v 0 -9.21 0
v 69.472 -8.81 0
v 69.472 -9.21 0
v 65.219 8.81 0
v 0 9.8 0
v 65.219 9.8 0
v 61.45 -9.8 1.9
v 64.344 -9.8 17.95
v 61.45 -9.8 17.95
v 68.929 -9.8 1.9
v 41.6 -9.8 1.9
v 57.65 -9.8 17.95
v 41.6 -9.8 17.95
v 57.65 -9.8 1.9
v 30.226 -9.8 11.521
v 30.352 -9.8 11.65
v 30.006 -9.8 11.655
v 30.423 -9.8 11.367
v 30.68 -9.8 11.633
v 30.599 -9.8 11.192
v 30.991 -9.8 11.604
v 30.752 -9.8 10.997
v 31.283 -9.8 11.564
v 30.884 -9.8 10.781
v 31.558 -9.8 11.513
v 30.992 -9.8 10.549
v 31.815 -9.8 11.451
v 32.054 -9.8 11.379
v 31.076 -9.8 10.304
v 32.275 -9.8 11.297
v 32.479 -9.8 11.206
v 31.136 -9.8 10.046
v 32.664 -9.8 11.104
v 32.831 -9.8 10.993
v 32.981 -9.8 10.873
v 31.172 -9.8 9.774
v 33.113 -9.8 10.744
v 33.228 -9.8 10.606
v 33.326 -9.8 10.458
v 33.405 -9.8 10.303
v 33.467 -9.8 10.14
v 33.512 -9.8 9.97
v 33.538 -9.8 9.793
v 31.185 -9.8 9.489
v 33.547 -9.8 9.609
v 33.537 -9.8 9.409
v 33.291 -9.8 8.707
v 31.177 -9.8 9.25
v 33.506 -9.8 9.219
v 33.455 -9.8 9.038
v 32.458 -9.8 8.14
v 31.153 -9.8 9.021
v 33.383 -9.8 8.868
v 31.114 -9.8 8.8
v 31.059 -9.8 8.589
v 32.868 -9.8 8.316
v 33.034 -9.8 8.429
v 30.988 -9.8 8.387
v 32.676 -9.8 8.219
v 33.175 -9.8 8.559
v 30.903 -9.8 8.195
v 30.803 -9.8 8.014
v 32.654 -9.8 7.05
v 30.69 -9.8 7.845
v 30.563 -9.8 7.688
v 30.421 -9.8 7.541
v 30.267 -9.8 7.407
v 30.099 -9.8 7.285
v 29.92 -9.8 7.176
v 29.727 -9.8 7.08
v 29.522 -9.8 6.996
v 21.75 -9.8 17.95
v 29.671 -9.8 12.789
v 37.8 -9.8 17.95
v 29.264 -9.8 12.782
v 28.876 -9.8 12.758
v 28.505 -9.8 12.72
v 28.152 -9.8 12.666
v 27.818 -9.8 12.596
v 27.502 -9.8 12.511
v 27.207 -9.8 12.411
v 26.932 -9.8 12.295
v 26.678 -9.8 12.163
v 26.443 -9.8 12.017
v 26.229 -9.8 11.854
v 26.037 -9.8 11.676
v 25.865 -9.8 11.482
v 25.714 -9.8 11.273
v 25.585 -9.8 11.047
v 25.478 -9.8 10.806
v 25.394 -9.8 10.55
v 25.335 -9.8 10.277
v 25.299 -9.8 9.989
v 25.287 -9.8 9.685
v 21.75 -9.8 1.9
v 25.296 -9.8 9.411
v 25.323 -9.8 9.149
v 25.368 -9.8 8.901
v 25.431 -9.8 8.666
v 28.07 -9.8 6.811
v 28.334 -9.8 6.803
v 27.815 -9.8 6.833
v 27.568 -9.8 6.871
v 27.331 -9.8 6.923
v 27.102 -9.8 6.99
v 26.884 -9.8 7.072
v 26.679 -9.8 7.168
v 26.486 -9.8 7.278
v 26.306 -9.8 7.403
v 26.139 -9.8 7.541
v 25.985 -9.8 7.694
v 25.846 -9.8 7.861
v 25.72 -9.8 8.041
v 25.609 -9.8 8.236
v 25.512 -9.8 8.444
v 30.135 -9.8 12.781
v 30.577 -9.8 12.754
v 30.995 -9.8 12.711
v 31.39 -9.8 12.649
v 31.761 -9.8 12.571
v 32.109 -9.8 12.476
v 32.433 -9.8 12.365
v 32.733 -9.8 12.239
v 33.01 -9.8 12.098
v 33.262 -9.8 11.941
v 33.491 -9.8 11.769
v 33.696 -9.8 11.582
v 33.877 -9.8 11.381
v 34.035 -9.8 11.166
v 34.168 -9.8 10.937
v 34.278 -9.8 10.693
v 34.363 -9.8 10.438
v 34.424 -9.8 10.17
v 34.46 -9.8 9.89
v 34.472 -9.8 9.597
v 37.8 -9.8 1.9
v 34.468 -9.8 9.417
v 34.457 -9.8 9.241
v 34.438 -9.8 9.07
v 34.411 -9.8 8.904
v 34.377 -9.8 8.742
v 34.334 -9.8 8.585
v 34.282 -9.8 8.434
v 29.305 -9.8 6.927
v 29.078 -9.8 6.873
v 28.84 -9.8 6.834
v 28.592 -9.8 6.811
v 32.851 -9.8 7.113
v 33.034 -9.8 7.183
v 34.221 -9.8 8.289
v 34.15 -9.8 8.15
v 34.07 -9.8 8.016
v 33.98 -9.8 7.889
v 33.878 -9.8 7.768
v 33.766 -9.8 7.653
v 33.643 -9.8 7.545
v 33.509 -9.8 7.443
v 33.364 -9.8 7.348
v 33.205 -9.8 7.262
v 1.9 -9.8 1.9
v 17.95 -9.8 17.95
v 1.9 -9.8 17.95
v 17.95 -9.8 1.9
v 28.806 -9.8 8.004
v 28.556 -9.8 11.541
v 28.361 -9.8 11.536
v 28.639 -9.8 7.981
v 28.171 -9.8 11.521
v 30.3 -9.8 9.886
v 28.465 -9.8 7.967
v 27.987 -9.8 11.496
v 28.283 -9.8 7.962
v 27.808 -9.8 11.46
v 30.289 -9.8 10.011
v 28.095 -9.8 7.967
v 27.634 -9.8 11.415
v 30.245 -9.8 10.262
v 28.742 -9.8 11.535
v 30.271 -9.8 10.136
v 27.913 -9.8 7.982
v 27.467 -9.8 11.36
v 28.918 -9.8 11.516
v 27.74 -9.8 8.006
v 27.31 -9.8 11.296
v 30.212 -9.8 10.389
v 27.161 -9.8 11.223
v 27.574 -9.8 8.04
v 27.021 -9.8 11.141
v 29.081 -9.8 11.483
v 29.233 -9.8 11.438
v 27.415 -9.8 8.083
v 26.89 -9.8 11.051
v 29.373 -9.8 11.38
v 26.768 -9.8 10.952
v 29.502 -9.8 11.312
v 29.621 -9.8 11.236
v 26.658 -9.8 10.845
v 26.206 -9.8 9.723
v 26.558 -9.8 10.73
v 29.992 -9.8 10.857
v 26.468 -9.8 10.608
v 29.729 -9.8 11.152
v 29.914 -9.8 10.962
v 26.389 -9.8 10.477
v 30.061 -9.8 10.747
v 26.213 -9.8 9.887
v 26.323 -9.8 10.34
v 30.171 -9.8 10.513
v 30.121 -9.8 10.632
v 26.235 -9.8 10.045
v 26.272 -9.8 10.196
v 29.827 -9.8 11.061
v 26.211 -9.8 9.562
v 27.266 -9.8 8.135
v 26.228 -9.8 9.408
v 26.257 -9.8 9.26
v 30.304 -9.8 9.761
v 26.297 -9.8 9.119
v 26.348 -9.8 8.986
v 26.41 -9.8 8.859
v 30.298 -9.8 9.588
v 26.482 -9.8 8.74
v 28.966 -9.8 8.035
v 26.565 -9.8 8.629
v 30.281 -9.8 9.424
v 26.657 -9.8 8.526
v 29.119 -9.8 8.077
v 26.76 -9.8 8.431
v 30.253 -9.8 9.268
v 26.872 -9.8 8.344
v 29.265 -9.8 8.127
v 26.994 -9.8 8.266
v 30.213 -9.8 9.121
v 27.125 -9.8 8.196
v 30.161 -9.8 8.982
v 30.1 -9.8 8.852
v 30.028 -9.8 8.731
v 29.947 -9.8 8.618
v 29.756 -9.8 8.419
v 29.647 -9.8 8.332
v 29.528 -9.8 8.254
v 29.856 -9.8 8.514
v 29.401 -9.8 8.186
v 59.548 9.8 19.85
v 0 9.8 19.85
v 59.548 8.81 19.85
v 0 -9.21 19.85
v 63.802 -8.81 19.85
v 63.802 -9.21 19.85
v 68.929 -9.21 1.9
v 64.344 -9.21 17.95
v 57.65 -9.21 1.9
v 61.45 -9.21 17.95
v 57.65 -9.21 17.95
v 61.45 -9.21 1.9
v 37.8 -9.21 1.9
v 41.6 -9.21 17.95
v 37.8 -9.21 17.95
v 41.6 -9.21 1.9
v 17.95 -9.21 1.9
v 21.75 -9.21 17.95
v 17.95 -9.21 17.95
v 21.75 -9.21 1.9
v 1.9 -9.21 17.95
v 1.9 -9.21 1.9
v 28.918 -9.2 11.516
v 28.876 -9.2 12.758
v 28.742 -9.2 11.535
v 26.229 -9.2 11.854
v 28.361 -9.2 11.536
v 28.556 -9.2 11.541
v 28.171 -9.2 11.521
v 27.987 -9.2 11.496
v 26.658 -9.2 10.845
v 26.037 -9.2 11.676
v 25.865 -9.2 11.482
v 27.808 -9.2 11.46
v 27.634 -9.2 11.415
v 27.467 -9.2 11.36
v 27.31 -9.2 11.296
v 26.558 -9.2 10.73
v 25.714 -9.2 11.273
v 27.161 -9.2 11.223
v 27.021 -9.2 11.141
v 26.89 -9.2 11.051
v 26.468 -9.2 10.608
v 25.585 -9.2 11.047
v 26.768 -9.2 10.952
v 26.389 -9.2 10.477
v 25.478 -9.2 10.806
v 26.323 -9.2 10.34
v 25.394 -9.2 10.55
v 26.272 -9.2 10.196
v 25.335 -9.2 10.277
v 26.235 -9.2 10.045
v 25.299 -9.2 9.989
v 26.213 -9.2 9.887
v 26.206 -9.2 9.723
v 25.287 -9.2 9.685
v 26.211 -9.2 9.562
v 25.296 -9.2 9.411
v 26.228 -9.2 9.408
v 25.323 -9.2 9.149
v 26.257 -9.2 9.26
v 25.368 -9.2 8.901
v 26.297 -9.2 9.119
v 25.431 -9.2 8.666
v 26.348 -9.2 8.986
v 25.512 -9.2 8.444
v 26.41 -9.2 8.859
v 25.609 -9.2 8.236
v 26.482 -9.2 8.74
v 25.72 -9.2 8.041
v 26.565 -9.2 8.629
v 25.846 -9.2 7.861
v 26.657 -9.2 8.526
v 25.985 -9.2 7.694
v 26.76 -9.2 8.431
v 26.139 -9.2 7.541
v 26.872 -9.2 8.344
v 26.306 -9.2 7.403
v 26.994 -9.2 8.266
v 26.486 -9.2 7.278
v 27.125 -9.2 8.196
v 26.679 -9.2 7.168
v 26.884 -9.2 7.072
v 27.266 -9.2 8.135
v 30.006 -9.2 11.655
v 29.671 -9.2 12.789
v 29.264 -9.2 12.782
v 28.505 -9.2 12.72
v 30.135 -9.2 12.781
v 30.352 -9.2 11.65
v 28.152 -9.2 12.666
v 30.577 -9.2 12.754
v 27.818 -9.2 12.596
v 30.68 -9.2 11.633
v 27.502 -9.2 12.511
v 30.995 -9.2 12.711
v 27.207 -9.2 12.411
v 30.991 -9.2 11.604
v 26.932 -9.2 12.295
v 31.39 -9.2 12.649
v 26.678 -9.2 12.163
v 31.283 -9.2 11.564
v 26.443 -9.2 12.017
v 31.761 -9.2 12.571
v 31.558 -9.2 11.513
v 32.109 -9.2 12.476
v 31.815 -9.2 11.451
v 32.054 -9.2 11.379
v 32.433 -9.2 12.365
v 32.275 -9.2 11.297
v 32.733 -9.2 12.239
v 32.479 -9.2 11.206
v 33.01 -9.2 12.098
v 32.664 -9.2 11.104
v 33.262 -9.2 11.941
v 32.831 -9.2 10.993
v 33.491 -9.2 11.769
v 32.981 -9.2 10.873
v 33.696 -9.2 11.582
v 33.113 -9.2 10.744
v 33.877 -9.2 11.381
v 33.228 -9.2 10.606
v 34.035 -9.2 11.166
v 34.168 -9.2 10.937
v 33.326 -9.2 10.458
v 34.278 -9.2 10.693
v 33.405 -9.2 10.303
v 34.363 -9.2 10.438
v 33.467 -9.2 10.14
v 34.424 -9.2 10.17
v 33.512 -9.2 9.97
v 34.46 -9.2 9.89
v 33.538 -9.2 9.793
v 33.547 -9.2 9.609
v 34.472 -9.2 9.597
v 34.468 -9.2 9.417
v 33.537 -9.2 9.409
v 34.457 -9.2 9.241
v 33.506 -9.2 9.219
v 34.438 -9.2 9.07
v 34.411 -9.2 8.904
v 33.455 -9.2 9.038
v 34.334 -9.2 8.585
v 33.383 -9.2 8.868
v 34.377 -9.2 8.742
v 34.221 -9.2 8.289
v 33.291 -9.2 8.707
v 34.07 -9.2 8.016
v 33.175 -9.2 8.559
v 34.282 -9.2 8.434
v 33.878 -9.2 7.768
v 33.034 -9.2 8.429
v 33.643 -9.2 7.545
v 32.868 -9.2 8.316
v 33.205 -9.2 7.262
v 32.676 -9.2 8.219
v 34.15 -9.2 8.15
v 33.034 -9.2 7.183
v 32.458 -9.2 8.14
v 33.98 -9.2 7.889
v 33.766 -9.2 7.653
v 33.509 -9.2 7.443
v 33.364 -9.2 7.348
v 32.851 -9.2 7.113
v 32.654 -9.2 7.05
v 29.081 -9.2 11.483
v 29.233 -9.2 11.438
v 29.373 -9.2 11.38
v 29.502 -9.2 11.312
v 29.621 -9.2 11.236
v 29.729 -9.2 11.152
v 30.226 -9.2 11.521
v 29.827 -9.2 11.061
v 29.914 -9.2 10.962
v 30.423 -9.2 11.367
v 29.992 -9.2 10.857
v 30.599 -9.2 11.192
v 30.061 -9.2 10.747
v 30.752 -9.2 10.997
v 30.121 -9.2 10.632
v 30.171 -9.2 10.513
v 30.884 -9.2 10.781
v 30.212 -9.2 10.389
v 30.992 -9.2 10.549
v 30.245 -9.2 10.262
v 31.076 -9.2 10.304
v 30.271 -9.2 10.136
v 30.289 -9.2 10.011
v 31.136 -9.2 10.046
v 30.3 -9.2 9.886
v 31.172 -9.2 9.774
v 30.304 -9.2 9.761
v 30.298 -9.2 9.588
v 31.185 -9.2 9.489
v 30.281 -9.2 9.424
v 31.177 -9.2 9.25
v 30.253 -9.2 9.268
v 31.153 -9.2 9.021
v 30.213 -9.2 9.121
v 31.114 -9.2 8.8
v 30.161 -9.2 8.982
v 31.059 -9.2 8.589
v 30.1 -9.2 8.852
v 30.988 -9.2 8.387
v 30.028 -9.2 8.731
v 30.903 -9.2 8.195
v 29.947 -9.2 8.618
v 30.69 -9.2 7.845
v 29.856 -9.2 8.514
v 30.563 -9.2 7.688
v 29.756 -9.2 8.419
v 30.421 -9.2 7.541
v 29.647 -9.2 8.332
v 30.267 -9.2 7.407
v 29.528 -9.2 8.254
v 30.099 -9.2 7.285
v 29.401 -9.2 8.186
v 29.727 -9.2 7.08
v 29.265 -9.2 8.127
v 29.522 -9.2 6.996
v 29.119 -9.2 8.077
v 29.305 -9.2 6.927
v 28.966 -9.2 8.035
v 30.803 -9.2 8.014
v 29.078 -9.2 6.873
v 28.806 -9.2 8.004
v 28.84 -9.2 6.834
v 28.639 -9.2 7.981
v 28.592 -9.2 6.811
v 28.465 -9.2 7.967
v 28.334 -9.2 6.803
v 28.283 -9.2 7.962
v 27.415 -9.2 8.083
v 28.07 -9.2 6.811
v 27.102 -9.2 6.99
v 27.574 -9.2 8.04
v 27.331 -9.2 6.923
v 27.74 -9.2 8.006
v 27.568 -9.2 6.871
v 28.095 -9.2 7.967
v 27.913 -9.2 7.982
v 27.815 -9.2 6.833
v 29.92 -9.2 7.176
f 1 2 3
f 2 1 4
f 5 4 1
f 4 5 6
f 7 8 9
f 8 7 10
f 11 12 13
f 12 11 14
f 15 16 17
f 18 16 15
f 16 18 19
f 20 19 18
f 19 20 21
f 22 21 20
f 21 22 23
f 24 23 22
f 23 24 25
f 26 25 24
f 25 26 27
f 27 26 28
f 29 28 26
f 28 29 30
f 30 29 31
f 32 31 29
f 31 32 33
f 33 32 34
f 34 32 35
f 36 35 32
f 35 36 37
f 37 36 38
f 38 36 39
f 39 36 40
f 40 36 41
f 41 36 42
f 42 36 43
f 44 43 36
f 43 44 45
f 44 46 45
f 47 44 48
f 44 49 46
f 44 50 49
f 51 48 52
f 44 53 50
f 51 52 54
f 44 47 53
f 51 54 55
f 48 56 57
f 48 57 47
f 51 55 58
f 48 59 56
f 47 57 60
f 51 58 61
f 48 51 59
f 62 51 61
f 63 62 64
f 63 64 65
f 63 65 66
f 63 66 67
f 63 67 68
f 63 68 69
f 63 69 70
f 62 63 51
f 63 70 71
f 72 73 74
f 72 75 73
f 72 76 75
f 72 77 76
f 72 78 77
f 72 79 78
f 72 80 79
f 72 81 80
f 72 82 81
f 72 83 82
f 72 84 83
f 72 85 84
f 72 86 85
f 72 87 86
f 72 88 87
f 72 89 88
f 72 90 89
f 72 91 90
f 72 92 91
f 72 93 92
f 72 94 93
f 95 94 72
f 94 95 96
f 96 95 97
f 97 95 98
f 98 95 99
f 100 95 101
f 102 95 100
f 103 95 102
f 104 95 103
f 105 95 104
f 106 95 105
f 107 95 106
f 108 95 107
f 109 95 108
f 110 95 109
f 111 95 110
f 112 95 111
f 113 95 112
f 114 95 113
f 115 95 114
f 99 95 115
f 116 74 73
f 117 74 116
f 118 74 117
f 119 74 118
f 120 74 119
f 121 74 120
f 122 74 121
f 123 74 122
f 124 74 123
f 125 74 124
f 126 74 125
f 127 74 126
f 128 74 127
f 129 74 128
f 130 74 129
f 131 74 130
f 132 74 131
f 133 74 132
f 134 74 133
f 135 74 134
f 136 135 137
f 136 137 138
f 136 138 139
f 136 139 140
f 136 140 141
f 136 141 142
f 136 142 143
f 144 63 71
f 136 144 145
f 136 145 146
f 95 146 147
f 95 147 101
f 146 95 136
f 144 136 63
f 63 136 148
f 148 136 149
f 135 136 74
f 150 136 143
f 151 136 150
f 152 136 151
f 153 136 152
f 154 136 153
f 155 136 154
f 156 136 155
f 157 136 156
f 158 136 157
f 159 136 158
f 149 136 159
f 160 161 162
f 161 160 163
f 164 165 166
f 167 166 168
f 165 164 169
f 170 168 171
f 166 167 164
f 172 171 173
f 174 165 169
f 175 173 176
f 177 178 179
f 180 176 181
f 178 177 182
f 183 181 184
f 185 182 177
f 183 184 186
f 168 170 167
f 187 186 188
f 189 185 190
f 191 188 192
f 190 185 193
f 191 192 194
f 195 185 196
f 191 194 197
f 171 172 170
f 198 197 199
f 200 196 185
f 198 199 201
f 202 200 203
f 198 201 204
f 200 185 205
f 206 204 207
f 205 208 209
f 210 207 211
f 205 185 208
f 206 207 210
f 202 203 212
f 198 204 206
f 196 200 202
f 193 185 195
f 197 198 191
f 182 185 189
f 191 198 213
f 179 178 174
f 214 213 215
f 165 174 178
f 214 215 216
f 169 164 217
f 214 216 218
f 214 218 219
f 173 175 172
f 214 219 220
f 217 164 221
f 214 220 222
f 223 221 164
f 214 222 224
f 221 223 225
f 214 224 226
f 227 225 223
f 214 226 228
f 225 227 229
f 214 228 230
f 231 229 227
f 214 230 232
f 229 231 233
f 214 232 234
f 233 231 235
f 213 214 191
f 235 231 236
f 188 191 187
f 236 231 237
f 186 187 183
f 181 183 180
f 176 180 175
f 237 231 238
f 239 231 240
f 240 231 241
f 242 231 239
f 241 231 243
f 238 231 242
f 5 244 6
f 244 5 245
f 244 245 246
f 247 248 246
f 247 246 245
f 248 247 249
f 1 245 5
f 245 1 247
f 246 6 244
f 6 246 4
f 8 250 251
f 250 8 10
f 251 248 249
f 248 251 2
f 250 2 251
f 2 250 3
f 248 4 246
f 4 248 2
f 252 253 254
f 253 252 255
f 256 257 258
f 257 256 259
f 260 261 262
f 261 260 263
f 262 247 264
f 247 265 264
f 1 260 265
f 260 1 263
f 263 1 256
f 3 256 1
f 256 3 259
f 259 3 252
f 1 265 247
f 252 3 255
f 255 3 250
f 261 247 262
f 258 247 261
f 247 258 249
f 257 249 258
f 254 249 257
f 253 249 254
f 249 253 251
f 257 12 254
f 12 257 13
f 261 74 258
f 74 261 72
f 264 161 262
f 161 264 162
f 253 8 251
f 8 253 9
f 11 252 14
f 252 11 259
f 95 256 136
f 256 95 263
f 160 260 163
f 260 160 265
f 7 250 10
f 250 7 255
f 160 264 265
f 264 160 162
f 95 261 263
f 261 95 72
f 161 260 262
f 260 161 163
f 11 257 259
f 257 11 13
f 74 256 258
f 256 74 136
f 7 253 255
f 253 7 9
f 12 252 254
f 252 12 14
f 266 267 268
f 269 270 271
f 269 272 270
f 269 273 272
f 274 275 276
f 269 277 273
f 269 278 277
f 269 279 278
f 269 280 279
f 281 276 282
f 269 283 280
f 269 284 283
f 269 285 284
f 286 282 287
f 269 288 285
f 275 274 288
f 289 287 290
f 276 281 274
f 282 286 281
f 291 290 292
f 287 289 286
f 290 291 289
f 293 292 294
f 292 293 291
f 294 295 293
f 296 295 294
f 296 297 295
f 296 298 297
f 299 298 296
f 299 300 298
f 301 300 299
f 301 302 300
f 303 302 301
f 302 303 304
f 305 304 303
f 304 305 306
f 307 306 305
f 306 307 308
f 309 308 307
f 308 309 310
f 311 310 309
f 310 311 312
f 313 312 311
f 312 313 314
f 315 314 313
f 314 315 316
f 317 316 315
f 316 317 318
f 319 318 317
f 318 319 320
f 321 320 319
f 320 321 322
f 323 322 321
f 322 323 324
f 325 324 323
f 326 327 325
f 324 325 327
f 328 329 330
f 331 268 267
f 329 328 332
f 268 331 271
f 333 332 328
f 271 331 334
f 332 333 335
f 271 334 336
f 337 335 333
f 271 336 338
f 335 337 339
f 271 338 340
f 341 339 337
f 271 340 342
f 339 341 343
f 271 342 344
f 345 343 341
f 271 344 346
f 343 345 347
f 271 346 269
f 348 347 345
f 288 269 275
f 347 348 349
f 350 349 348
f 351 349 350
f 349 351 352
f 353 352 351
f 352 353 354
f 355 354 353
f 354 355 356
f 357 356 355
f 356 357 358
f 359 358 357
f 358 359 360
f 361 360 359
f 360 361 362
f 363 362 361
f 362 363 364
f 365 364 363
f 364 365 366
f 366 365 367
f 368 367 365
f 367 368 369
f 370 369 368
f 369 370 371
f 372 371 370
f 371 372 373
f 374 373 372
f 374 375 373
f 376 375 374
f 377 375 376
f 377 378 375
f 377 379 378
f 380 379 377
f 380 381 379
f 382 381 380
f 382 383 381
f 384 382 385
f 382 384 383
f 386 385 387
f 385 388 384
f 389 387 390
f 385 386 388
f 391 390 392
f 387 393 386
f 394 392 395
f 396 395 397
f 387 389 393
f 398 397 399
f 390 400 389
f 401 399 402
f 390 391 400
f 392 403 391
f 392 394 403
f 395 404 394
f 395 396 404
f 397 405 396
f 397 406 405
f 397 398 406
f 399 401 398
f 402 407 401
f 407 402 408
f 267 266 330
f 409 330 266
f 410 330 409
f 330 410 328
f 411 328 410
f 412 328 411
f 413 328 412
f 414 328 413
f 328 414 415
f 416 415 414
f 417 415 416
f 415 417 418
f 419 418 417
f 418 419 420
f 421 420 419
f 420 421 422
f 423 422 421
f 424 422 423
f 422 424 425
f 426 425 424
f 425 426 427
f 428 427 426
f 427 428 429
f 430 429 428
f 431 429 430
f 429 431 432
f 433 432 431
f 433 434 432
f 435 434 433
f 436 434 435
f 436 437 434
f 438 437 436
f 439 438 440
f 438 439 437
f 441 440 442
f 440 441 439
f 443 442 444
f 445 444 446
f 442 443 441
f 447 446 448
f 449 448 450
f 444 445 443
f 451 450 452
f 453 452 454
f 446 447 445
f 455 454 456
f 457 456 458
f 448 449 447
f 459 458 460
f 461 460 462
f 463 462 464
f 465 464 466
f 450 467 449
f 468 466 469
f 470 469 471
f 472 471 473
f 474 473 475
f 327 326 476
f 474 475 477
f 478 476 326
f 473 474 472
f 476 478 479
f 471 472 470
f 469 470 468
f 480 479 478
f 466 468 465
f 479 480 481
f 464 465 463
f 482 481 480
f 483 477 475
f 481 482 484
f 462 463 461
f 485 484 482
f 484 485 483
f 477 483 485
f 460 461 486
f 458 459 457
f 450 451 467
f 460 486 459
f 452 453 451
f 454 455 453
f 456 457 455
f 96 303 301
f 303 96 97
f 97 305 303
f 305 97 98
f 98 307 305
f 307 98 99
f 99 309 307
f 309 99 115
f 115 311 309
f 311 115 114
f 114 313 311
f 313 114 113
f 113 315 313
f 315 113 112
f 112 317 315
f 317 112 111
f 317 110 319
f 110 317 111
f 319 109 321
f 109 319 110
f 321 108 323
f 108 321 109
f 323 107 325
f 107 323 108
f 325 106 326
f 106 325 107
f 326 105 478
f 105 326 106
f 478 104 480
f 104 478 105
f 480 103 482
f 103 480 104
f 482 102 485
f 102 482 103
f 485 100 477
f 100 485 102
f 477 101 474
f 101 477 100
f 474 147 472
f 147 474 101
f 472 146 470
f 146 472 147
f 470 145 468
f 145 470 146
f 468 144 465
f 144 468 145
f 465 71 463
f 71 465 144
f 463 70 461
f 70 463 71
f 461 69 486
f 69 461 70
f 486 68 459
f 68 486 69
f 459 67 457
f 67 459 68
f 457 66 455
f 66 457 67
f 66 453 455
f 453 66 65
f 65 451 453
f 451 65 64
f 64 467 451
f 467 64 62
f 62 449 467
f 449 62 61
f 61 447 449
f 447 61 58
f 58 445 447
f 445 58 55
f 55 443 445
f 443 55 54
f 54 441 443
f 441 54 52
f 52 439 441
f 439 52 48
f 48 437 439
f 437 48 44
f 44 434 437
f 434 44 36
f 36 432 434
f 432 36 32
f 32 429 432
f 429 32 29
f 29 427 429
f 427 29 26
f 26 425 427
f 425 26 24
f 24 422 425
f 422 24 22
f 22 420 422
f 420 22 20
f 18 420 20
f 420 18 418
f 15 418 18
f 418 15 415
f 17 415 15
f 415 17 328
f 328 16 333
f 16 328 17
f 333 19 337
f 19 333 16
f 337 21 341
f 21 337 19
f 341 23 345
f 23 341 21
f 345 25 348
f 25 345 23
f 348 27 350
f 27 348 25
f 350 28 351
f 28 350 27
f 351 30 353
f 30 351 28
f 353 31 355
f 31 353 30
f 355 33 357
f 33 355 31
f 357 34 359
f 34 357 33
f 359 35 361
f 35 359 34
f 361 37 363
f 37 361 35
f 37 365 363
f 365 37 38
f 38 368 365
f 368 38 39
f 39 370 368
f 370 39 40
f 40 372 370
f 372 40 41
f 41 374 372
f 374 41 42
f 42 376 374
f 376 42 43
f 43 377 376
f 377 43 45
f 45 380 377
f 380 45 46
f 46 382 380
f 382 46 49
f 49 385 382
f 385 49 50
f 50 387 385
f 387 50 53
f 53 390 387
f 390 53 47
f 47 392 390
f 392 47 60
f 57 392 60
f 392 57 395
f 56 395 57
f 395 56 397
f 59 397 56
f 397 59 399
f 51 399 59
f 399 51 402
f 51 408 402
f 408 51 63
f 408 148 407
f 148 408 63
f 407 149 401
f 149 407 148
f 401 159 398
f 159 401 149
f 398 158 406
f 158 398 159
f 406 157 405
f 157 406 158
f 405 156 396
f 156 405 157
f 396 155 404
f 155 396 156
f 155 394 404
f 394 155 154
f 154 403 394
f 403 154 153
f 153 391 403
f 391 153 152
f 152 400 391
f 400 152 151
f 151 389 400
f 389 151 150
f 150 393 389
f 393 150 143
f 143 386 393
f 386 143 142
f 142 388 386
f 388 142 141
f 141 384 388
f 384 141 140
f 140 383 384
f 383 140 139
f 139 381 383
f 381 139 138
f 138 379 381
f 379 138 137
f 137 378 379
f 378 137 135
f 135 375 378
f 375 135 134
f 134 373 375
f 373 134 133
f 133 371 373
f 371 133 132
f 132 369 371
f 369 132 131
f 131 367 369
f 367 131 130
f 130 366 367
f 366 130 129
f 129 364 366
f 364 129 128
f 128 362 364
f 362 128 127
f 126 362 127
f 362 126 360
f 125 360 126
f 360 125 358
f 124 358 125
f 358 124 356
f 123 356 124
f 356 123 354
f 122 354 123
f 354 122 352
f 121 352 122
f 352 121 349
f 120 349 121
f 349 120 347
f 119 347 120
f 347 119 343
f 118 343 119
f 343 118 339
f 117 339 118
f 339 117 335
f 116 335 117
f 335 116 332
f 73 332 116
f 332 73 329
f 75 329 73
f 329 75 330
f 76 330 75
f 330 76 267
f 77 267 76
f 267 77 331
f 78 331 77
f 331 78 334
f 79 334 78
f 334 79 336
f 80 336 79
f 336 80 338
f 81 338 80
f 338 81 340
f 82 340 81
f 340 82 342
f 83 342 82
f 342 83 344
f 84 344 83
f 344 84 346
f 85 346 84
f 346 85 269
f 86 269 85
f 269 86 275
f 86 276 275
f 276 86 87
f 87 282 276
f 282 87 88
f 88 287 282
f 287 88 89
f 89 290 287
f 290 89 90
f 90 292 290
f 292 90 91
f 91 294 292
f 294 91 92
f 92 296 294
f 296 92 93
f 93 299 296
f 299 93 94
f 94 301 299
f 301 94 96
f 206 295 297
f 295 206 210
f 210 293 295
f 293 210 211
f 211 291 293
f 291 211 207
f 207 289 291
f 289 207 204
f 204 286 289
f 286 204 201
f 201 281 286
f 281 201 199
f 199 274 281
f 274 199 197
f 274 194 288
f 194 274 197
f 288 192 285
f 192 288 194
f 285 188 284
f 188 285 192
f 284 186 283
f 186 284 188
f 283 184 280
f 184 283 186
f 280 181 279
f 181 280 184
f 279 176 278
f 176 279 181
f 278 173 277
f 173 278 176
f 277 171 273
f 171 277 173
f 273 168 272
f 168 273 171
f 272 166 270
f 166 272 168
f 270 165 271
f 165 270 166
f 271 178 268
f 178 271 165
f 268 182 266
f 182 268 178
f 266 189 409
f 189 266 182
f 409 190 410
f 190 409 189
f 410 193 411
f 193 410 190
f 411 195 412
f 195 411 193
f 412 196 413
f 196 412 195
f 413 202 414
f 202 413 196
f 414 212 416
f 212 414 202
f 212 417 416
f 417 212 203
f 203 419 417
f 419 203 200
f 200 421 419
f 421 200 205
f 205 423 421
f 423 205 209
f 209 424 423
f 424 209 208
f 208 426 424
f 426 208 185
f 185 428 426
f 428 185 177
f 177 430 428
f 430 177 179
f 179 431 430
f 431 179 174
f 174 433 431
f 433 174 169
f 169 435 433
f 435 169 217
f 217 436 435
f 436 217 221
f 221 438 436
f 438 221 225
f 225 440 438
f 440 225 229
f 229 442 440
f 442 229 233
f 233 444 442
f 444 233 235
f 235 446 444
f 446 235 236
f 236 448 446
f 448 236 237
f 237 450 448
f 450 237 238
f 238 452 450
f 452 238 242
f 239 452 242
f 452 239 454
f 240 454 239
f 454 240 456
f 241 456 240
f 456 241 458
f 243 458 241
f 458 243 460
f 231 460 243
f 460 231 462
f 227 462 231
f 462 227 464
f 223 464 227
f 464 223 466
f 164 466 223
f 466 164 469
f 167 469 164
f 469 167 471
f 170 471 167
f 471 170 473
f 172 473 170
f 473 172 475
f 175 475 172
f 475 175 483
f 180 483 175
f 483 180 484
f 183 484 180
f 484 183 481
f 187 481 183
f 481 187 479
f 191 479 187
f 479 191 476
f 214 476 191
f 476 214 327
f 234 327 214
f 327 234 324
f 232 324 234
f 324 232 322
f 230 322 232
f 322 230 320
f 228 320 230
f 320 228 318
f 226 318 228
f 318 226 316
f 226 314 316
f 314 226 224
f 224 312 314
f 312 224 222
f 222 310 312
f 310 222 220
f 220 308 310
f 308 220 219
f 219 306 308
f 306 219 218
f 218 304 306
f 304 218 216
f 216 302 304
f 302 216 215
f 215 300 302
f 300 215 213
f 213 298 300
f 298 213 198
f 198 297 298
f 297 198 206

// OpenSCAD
/*

  puzzle_part_6.scad

  Winston Freer Tile Puzzle: Part 6
      
  (c) olikraus@gmail.com

  This work is licensed under the Creative Commons Attribution-NonCommercial-ShareAlike 4.0 International License. 
  To view a copy of this license, visit http://creativecommons.org/licenses/by-nc-sa/4.0/.
    
*/

include <winston_freer.scad>;


rotate([0,90,-90]) 
translate([-7*ts,-2*ts,0]) 
part6();
